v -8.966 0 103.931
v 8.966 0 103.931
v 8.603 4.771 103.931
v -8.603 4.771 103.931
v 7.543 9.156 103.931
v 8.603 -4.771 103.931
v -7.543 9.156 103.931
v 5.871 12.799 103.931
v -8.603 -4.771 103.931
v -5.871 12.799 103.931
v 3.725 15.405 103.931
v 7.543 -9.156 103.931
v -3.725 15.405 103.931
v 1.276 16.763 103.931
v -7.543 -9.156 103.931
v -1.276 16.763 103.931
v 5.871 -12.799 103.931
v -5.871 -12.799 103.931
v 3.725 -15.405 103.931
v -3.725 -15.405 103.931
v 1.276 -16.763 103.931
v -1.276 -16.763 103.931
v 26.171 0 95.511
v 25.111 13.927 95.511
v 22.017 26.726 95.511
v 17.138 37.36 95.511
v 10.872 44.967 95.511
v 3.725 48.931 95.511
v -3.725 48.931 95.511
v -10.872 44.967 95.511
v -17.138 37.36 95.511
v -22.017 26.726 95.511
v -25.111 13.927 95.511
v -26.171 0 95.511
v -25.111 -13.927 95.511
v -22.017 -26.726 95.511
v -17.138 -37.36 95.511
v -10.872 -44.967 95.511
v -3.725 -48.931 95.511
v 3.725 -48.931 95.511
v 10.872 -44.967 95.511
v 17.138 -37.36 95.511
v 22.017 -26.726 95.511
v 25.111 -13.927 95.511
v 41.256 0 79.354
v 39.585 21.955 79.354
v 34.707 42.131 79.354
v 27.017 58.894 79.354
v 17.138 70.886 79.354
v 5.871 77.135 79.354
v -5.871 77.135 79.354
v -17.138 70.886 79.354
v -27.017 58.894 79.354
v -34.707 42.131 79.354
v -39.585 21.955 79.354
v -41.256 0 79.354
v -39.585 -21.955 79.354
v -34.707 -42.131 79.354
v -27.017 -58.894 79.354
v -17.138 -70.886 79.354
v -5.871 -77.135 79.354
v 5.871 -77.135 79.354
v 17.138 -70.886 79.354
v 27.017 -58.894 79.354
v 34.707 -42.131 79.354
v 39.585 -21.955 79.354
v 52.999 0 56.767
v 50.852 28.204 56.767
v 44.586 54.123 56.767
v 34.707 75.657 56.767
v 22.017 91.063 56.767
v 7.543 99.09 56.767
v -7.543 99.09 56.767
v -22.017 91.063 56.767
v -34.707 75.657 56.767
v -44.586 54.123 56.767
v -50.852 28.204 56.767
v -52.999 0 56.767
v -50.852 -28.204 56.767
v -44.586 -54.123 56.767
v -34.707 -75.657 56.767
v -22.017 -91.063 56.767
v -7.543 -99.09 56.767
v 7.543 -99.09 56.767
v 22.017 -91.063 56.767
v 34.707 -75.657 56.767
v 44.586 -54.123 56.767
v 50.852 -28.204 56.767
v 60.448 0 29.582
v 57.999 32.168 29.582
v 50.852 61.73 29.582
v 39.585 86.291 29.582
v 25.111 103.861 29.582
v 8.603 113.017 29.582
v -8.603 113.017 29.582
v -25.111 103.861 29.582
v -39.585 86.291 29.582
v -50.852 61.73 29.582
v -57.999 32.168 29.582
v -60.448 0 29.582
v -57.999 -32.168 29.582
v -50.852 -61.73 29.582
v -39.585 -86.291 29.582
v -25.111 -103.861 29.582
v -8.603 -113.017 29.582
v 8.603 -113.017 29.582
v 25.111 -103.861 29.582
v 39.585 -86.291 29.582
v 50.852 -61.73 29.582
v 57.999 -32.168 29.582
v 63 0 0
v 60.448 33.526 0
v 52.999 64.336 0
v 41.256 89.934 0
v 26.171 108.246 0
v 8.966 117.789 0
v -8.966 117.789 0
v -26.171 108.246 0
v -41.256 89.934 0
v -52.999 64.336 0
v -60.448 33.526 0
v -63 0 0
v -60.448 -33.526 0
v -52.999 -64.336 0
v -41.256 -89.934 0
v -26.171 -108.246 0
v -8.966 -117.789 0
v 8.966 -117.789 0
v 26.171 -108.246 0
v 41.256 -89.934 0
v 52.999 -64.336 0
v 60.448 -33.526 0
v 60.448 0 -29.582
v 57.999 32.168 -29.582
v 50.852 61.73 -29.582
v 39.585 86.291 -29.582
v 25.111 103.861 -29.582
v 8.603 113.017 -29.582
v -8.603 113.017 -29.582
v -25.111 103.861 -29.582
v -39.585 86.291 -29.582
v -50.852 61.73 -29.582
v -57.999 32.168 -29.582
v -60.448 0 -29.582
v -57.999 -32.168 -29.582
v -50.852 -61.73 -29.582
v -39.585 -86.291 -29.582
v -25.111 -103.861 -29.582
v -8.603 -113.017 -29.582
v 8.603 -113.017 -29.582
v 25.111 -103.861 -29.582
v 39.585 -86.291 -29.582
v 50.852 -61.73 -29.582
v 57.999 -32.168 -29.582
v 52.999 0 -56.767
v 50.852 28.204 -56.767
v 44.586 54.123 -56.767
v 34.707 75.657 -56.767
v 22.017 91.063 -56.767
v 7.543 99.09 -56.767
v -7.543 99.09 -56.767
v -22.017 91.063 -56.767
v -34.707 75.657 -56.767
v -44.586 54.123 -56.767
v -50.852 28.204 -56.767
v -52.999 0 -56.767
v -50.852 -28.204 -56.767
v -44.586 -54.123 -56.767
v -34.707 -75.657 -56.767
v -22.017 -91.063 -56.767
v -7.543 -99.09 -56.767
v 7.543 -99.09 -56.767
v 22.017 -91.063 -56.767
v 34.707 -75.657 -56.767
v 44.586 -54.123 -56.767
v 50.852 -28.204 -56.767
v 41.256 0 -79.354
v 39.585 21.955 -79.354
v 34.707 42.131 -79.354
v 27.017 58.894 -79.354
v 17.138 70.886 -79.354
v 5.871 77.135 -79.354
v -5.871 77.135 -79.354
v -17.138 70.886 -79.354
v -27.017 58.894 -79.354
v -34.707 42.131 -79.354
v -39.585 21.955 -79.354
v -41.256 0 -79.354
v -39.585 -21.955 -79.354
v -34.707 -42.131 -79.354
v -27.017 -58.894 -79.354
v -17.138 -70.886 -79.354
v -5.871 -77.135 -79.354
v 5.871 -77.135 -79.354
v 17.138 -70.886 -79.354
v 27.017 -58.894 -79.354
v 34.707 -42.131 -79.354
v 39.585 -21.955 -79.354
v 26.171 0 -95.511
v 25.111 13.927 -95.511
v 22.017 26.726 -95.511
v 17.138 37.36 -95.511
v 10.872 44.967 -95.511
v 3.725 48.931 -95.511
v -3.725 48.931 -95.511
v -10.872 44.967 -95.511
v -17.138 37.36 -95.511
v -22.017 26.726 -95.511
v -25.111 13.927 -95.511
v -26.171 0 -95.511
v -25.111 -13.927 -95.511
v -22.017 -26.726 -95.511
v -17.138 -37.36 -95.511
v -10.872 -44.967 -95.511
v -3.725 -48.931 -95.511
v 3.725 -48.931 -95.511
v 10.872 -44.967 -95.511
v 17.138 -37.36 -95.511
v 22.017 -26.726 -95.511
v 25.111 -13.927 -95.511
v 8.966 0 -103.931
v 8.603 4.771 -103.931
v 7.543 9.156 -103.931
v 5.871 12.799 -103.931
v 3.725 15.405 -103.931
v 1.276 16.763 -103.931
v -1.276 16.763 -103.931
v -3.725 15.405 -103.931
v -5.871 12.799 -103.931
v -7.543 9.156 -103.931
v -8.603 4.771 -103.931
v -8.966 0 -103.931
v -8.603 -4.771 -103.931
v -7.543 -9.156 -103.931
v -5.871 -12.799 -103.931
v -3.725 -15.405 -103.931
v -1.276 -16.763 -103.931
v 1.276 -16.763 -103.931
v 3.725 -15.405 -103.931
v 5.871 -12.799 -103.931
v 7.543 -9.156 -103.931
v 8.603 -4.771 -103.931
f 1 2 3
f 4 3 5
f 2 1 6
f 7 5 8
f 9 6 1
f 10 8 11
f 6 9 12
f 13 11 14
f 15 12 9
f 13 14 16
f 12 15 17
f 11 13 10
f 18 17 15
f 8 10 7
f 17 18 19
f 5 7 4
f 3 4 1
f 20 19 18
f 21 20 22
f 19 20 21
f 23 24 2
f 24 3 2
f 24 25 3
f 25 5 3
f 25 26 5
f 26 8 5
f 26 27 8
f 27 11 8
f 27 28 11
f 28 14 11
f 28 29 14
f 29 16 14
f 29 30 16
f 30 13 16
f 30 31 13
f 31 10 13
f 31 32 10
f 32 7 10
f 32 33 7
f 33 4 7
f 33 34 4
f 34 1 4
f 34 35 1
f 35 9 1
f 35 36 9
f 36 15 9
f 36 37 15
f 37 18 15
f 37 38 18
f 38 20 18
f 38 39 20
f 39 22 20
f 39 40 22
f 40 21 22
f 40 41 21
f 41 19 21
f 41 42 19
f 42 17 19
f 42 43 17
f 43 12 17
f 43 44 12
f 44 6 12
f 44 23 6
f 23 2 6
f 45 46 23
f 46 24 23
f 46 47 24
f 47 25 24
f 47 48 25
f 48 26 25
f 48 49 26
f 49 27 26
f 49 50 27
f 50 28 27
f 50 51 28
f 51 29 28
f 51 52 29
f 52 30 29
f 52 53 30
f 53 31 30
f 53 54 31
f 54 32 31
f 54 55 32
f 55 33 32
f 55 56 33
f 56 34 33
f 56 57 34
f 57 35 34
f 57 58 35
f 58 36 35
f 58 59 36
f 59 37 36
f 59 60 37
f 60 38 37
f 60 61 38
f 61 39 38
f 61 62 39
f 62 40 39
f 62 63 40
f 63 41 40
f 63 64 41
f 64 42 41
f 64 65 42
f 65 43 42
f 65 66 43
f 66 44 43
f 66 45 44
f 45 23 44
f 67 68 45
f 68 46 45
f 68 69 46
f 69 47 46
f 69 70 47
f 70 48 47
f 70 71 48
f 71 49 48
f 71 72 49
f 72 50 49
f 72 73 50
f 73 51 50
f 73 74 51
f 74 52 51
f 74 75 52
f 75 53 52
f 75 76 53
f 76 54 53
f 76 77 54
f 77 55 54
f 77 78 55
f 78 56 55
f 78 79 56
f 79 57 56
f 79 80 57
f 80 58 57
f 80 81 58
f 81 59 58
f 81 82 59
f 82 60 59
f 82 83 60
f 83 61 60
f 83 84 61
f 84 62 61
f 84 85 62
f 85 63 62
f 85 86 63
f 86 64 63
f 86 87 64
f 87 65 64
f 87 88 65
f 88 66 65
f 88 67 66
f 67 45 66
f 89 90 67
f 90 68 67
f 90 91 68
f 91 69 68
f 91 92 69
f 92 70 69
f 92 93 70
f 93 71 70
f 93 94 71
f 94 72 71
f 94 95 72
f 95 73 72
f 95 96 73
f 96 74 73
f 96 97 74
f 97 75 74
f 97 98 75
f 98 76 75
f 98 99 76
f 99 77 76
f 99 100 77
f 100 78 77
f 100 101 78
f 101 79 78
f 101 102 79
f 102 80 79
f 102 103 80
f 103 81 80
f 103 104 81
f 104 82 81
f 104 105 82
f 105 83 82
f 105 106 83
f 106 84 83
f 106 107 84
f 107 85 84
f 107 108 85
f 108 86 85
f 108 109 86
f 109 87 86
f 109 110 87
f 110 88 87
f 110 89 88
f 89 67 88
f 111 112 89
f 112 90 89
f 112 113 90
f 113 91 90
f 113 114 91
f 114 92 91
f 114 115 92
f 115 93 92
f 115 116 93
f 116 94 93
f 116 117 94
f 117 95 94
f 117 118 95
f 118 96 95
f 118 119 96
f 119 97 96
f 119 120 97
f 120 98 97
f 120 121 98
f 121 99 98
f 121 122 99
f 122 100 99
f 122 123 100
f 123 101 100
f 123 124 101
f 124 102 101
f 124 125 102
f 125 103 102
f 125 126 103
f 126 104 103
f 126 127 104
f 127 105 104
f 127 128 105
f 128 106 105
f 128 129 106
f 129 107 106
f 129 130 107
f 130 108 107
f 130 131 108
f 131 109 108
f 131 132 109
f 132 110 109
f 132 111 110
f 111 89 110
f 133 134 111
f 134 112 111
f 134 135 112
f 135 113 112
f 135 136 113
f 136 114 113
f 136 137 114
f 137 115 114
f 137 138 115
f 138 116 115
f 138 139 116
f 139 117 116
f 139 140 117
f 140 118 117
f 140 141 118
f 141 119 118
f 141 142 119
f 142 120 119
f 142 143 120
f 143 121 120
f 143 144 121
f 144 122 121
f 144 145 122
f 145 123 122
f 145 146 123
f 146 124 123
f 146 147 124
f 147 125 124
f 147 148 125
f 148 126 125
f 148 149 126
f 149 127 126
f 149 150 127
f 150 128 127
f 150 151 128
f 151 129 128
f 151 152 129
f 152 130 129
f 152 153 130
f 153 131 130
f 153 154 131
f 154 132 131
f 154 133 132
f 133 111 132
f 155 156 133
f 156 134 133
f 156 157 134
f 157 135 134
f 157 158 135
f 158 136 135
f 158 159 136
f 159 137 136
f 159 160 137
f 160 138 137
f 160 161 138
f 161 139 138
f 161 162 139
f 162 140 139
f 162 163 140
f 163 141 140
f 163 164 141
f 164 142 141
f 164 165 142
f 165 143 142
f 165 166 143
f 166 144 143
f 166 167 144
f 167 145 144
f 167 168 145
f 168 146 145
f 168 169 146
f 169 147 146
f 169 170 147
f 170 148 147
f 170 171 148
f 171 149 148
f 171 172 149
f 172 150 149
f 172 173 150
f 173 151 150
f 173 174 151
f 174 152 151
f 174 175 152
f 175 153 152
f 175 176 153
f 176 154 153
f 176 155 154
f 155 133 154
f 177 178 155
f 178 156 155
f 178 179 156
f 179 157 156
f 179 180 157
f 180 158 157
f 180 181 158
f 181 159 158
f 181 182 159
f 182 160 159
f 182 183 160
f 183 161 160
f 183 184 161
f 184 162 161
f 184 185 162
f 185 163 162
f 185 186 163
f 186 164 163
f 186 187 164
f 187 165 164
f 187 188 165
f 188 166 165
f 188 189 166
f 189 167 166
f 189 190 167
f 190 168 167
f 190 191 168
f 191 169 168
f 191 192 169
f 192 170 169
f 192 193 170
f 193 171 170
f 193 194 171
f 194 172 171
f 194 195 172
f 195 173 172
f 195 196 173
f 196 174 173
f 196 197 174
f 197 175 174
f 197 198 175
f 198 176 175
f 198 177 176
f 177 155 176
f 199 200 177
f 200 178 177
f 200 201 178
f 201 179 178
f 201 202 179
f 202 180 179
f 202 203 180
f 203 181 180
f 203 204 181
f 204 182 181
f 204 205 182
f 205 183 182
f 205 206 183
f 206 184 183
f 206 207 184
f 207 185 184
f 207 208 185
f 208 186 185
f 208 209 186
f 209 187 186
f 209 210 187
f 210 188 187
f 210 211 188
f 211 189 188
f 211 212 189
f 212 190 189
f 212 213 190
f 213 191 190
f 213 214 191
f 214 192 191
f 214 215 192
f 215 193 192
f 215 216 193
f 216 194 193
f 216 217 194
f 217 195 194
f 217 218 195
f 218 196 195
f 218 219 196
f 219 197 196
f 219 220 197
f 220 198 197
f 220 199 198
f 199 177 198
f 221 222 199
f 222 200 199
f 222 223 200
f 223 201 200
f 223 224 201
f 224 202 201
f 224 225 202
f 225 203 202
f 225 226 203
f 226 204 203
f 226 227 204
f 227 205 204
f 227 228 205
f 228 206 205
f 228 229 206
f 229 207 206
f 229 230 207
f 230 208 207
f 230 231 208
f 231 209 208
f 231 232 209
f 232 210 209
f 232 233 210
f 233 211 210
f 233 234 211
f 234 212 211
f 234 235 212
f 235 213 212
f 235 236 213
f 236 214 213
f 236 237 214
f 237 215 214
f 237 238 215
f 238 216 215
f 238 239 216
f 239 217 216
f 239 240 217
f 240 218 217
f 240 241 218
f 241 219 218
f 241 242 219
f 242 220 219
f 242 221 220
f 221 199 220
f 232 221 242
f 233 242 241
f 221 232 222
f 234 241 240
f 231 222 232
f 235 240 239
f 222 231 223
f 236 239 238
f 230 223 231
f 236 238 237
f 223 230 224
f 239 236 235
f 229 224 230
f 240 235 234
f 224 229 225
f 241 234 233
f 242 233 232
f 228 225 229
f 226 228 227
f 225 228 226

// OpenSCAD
// Generated by SolidPython 1.0.1 on 2020-07-29 00:46:49


scale(v = [9, 17, 15]) {
	sphere(r = 7);
}
/***********************************************
*********      SolidPython code:      **********
************************************************
 
# import packages: SolidPython
from solid import *
from solid.utils import *
from itertools import chain, combinations, permutations


class Resize:

    def __init__(self, scad_file):
        self.scad_file = scad_file
        #self.scad_file = import_scad(scad_file)
        # cone/cylinder param:
        self.r1 = 0
        self.r2 = 0
        self.h = 0
        # rectangular prism param:
        self.w = 0
        self.l = 0
        # ellipse param:
        self.r = 0

    # import OpenScad code (file name corresponds to shape)


    # classify shape + parameters
    def assign(self, param1, param2, param3):
        if self.scad_file == 'cone.scad':
            self.r1 = param1
            self.r2 = param2
            self.h = param3
        elif self.scad_file == 'cylinder.scad':
            self.r1 = param1
            self.r2 = param2
            self.h = param3
        elif self.scad_file == 'rectangularPrism.scad':
            self.h = param1
            self.l = param2
            self.w = param3
        else:
            self.r = param1
            self.h = param2

    # resize parameters
    def iterate(self):
        x = range(3, 20, 2)
        i = 1
        if self.scad_file == 'cone.scad':
            tempList = list(permutations(x, 2))
            for temp in tempList:
                param1 = temp[0]
                param2 = temp[1]
                filepath = 'produced_scad_files/' + 'cone' + str(param1) + '_' + str(param2) + '_' + '.scad'
                scad_render_to_file(cylinder(h=param1, r1=param2, r2=0), filepath)

        elif self.scad_file == 'cylinder.scad':
            tempList = list(permutations(x, 3))
            for temp in tempList:
                param1 = temp[0]
                param2 = temp[1]
                filepath = 'produced_scad_files/' + 'cylinder' + str(param1) + '_' + str(param2) + '_' + '.scad'
                scad_render_to_file(cylinder(h=param1, r1=param2, r2=param2), filepath)

        elif self.scad_file == 'rectangularPrism.scad':
            tempList = list(permutations(x, 3))
            for temp in tempList:
                param1 = temp[0]
                param2 = temp[1]
                param3 = temp[2]
                filepath = 'produced_scad_files/' + 'rectangularPrism' + str(param1) + '_' + str(param2) + '_' + str(
                    param3) + '.scad'
                scad_render_to_file(cube(size=(param1, param2, param3)), filepath)

        elif self.scad_file == 'ellipse.scad':
            tempList = list(permutations(x, 4))
            for temp in tempList:
                param1 = temp[0]
                param2 = temp[1]
                param3 = temp[2]
                param4 = temp[3]
                filepath = 'produced_scad_files/' + 'ellipse' + str(param1) + '_' + str(param2) + '_' + str(param3) + '_' + str(param4) + '.scad'
                scad_render_to_file(scale([param1, param2, param3])(sphere(r=param4)), filepath)

    def render_to_scadfile(self):
        scad_render_to_file(scad, 'example.scad') 
 
************************************************/
